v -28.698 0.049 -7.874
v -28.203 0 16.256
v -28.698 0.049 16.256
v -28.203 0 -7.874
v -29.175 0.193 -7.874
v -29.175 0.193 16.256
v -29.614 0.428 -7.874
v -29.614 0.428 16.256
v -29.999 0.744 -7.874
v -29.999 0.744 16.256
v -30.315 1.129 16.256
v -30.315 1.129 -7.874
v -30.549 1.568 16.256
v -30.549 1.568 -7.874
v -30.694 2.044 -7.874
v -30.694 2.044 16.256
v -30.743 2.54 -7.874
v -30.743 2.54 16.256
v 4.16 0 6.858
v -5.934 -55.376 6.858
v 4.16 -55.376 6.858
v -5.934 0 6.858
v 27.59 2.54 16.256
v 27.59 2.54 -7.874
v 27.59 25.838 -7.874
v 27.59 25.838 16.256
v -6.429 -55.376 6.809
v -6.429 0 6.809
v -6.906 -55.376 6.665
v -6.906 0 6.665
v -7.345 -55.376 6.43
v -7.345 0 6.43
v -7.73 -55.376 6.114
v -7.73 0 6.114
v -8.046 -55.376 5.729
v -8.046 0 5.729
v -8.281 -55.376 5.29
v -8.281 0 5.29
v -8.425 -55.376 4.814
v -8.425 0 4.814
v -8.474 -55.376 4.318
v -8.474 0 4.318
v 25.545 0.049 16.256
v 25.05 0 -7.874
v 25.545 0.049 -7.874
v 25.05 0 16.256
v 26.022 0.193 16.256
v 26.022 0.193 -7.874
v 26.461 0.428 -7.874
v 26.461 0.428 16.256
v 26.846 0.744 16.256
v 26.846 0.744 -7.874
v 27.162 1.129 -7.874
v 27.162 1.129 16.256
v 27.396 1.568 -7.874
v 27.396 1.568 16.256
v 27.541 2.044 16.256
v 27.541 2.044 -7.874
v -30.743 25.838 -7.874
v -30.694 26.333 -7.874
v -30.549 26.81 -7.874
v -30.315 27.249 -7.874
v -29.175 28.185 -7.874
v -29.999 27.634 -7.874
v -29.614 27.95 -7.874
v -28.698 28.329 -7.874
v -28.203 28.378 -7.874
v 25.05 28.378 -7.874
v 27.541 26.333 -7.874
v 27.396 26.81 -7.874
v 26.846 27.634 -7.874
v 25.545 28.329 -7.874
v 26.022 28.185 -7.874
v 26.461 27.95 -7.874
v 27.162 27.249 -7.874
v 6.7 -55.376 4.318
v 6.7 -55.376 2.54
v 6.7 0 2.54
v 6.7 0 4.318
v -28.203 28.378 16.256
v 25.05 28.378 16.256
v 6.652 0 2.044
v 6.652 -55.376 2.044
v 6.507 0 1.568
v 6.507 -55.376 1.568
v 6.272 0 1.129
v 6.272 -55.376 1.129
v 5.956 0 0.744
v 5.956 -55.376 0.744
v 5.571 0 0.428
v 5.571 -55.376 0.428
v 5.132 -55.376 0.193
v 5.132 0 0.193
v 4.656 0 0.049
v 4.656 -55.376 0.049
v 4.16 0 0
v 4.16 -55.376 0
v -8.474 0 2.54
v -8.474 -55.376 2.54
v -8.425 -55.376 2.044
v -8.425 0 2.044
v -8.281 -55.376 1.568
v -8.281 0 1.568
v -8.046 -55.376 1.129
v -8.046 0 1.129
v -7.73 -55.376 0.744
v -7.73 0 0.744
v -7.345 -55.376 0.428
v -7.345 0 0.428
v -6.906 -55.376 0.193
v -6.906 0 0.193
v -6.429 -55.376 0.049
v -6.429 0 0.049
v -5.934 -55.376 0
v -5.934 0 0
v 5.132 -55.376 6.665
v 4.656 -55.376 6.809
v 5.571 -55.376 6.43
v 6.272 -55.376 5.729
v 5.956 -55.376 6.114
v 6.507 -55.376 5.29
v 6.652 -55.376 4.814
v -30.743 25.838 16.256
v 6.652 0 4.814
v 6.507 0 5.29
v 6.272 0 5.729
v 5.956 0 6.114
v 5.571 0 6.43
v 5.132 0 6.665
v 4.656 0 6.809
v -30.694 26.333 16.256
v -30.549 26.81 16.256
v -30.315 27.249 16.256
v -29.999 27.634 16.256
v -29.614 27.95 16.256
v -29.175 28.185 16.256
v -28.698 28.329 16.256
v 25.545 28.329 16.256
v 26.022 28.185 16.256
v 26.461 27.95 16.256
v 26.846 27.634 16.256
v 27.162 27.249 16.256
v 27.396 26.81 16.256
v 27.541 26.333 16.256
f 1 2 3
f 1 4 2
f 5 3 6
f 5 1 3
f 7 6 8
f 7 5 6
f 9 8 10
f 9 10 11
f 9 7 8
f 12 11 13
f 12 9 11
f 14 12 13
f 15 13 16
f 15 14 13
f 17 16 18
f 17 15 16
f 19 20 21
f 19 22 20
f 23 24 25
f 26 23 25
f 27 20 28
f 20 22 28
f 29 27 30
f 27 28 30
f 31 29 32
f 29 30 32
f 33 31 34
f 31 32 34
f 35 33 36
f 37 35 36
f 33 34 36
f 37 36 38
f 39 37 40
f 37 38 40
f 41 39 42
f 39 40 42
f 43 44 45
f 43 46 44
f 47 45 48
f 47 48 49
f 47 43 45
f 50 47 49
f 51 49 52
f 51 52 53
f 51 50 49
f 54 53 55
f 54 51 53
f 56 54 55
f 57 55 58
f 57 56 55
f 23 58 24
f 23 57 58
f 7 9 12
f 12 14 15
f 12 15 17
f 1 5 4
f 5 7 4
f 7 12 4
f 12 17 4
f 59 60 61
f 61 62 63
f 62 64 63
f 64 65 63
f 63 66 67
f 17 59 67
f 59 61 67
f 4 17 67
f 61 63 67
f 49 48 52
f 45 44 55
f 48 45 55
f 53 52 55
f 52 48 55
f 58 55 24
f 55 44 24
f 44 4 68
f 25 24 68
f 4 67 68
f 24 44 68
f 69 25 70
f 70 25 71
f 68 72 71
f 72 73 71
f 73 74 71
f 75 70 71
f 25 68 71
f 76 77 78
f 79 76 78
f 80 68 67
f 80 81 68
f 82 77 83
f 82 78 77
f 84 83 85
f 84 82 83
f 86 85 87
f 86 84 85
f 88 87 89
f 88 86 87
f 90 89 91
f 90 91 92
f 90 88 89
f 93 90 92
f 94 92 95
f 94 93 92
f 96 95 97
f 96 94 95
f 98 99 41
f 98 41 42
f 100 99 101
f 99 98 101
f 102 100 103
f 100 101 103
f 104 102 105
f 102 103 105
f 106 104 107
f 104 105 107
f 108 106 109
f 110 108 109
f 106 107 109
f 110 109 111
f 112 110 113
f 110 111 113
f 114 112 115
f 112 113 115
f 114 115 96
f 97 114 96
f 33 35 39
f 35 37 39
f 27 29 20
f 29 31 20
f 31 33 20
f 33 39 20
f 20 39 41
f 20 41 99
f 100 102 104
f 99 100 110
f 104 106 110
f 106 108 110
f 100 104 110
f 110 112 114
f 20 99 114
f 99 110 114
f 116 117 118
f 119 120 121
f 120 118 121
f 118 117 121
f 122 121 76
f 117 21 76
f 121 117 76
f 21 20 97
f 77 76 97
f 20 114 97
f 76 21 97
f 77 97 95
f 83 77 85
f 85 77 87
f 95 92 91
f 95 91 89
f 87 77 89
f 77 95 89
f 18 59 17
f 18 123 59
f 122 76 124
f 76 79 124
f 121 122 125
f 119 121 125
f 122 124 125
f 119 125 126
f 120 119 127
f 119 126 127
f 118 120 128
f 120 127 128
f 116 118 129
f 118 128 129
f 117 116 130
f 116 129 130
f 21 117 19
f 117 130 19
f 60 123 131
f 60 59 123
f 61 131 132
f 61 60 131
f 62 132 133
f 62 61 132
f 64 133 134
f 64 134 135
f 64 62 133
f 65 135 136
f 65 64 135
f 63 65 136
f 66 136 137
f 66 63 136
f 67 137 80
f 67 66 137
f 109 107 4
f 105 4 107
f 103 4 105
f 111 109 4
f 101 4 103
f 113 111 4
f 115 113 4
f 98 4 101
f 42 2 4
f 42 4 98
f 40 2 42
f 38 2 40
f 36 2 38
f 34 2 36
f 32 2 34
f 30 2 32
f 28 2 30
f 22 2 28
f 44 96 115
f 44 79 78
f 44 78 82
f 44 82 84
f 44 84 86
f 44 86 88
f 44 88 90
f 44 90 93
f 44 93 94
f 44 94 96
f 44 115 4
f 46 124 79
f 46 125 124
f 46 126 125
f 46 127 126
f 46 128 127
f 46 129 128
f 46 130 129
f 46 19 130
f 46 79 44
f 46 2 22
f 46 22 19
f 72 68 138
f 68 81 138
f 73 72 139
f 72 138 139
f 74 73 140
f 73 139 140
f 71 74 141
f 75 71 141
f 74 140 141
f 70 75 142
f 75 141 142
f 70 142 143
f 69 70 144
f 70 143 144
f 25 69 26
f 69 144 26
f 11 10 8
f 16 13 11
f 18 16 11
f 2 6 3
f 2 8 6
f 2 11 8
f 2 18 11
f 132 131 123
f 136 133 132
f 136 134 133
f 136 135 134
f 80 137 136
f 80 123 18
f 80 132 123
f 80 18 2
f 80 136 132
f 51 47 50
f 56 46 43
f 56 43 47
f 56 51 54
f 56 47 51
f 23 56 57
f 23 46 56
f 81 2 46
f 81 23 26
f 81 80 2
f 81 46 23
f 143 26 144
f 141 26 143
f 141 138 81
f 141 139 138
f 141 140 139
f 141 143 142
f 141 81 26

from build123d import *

# Parameters (mm, degrees)
F0_W     = 15.1743106544
F0_H     = 55.376380682
F1_DEPTH = 6.35
F2_DEPTH = 16.256
F3_DEPTH = 0.508
F4_DEPTH = 7.874
F5_R     = 2.54


with BuildPart() as f1:
    # F0 (on Top) → F1 (new body)
    with BuildSketch(Plane.XY):
        with Locations((-0.8868109435, -27.688190341)):
            Rectangle(F0_W, F0_H)
    extrude(amount=F1_DEPTH)

    # F0 (on Top) → F2 (join)
    with BuildSketch(Plane.XY):
        Polygon((-30.742758885, 0), (-8.4739662707, 0), (6.7003443837, 0), (27.5896564126, 0), (27.5896564126, 28.3779297024), (-30.742758885, 28.3779297024), align=None)
    extrude(amount=F2_DEPTH)

    # F3 (add): a face of the model
    f3_faces = [f1.faces().sort_by_distance(p)[0] for p in [
        (-0.8868109435, -27.688190341, 6.35),
    ]]
    extrude(f3_faces, amount=F3_DEPTH)

    # F0 (on Top) → F4 (join)
    with BuildSketch(Plane.XY):
        Polygon((-30.742758885, 0), (-8.4739662707, 0), (6.7003443837, 0), (27.5896564126, 0), (27.5896564126, 28.3779297024), (-30.742758885, 28.3779297024), align=None)
    extrude(amount=-F4_DEPTH)

    # F5
    f5_edges = [f1.edges().sort_by_distance(p)[0] for p in [
        (-8.473966, -27.68819, 0),
        (-8.473966, -27.68819, 6.858),
        (6.700344, -27.68819, 6.858),
        (6.700344, -27.68819, 0),
        (27.589656, 0, 4.191),
        (-30.742759, 0, 4.191),
        (-30.742759, 28.37793, 4.191),
        (27.589656, 28.37793, 4.191),
    ]]
    fillet(f5_edges, radius=F5_R)


solid = f1.part
